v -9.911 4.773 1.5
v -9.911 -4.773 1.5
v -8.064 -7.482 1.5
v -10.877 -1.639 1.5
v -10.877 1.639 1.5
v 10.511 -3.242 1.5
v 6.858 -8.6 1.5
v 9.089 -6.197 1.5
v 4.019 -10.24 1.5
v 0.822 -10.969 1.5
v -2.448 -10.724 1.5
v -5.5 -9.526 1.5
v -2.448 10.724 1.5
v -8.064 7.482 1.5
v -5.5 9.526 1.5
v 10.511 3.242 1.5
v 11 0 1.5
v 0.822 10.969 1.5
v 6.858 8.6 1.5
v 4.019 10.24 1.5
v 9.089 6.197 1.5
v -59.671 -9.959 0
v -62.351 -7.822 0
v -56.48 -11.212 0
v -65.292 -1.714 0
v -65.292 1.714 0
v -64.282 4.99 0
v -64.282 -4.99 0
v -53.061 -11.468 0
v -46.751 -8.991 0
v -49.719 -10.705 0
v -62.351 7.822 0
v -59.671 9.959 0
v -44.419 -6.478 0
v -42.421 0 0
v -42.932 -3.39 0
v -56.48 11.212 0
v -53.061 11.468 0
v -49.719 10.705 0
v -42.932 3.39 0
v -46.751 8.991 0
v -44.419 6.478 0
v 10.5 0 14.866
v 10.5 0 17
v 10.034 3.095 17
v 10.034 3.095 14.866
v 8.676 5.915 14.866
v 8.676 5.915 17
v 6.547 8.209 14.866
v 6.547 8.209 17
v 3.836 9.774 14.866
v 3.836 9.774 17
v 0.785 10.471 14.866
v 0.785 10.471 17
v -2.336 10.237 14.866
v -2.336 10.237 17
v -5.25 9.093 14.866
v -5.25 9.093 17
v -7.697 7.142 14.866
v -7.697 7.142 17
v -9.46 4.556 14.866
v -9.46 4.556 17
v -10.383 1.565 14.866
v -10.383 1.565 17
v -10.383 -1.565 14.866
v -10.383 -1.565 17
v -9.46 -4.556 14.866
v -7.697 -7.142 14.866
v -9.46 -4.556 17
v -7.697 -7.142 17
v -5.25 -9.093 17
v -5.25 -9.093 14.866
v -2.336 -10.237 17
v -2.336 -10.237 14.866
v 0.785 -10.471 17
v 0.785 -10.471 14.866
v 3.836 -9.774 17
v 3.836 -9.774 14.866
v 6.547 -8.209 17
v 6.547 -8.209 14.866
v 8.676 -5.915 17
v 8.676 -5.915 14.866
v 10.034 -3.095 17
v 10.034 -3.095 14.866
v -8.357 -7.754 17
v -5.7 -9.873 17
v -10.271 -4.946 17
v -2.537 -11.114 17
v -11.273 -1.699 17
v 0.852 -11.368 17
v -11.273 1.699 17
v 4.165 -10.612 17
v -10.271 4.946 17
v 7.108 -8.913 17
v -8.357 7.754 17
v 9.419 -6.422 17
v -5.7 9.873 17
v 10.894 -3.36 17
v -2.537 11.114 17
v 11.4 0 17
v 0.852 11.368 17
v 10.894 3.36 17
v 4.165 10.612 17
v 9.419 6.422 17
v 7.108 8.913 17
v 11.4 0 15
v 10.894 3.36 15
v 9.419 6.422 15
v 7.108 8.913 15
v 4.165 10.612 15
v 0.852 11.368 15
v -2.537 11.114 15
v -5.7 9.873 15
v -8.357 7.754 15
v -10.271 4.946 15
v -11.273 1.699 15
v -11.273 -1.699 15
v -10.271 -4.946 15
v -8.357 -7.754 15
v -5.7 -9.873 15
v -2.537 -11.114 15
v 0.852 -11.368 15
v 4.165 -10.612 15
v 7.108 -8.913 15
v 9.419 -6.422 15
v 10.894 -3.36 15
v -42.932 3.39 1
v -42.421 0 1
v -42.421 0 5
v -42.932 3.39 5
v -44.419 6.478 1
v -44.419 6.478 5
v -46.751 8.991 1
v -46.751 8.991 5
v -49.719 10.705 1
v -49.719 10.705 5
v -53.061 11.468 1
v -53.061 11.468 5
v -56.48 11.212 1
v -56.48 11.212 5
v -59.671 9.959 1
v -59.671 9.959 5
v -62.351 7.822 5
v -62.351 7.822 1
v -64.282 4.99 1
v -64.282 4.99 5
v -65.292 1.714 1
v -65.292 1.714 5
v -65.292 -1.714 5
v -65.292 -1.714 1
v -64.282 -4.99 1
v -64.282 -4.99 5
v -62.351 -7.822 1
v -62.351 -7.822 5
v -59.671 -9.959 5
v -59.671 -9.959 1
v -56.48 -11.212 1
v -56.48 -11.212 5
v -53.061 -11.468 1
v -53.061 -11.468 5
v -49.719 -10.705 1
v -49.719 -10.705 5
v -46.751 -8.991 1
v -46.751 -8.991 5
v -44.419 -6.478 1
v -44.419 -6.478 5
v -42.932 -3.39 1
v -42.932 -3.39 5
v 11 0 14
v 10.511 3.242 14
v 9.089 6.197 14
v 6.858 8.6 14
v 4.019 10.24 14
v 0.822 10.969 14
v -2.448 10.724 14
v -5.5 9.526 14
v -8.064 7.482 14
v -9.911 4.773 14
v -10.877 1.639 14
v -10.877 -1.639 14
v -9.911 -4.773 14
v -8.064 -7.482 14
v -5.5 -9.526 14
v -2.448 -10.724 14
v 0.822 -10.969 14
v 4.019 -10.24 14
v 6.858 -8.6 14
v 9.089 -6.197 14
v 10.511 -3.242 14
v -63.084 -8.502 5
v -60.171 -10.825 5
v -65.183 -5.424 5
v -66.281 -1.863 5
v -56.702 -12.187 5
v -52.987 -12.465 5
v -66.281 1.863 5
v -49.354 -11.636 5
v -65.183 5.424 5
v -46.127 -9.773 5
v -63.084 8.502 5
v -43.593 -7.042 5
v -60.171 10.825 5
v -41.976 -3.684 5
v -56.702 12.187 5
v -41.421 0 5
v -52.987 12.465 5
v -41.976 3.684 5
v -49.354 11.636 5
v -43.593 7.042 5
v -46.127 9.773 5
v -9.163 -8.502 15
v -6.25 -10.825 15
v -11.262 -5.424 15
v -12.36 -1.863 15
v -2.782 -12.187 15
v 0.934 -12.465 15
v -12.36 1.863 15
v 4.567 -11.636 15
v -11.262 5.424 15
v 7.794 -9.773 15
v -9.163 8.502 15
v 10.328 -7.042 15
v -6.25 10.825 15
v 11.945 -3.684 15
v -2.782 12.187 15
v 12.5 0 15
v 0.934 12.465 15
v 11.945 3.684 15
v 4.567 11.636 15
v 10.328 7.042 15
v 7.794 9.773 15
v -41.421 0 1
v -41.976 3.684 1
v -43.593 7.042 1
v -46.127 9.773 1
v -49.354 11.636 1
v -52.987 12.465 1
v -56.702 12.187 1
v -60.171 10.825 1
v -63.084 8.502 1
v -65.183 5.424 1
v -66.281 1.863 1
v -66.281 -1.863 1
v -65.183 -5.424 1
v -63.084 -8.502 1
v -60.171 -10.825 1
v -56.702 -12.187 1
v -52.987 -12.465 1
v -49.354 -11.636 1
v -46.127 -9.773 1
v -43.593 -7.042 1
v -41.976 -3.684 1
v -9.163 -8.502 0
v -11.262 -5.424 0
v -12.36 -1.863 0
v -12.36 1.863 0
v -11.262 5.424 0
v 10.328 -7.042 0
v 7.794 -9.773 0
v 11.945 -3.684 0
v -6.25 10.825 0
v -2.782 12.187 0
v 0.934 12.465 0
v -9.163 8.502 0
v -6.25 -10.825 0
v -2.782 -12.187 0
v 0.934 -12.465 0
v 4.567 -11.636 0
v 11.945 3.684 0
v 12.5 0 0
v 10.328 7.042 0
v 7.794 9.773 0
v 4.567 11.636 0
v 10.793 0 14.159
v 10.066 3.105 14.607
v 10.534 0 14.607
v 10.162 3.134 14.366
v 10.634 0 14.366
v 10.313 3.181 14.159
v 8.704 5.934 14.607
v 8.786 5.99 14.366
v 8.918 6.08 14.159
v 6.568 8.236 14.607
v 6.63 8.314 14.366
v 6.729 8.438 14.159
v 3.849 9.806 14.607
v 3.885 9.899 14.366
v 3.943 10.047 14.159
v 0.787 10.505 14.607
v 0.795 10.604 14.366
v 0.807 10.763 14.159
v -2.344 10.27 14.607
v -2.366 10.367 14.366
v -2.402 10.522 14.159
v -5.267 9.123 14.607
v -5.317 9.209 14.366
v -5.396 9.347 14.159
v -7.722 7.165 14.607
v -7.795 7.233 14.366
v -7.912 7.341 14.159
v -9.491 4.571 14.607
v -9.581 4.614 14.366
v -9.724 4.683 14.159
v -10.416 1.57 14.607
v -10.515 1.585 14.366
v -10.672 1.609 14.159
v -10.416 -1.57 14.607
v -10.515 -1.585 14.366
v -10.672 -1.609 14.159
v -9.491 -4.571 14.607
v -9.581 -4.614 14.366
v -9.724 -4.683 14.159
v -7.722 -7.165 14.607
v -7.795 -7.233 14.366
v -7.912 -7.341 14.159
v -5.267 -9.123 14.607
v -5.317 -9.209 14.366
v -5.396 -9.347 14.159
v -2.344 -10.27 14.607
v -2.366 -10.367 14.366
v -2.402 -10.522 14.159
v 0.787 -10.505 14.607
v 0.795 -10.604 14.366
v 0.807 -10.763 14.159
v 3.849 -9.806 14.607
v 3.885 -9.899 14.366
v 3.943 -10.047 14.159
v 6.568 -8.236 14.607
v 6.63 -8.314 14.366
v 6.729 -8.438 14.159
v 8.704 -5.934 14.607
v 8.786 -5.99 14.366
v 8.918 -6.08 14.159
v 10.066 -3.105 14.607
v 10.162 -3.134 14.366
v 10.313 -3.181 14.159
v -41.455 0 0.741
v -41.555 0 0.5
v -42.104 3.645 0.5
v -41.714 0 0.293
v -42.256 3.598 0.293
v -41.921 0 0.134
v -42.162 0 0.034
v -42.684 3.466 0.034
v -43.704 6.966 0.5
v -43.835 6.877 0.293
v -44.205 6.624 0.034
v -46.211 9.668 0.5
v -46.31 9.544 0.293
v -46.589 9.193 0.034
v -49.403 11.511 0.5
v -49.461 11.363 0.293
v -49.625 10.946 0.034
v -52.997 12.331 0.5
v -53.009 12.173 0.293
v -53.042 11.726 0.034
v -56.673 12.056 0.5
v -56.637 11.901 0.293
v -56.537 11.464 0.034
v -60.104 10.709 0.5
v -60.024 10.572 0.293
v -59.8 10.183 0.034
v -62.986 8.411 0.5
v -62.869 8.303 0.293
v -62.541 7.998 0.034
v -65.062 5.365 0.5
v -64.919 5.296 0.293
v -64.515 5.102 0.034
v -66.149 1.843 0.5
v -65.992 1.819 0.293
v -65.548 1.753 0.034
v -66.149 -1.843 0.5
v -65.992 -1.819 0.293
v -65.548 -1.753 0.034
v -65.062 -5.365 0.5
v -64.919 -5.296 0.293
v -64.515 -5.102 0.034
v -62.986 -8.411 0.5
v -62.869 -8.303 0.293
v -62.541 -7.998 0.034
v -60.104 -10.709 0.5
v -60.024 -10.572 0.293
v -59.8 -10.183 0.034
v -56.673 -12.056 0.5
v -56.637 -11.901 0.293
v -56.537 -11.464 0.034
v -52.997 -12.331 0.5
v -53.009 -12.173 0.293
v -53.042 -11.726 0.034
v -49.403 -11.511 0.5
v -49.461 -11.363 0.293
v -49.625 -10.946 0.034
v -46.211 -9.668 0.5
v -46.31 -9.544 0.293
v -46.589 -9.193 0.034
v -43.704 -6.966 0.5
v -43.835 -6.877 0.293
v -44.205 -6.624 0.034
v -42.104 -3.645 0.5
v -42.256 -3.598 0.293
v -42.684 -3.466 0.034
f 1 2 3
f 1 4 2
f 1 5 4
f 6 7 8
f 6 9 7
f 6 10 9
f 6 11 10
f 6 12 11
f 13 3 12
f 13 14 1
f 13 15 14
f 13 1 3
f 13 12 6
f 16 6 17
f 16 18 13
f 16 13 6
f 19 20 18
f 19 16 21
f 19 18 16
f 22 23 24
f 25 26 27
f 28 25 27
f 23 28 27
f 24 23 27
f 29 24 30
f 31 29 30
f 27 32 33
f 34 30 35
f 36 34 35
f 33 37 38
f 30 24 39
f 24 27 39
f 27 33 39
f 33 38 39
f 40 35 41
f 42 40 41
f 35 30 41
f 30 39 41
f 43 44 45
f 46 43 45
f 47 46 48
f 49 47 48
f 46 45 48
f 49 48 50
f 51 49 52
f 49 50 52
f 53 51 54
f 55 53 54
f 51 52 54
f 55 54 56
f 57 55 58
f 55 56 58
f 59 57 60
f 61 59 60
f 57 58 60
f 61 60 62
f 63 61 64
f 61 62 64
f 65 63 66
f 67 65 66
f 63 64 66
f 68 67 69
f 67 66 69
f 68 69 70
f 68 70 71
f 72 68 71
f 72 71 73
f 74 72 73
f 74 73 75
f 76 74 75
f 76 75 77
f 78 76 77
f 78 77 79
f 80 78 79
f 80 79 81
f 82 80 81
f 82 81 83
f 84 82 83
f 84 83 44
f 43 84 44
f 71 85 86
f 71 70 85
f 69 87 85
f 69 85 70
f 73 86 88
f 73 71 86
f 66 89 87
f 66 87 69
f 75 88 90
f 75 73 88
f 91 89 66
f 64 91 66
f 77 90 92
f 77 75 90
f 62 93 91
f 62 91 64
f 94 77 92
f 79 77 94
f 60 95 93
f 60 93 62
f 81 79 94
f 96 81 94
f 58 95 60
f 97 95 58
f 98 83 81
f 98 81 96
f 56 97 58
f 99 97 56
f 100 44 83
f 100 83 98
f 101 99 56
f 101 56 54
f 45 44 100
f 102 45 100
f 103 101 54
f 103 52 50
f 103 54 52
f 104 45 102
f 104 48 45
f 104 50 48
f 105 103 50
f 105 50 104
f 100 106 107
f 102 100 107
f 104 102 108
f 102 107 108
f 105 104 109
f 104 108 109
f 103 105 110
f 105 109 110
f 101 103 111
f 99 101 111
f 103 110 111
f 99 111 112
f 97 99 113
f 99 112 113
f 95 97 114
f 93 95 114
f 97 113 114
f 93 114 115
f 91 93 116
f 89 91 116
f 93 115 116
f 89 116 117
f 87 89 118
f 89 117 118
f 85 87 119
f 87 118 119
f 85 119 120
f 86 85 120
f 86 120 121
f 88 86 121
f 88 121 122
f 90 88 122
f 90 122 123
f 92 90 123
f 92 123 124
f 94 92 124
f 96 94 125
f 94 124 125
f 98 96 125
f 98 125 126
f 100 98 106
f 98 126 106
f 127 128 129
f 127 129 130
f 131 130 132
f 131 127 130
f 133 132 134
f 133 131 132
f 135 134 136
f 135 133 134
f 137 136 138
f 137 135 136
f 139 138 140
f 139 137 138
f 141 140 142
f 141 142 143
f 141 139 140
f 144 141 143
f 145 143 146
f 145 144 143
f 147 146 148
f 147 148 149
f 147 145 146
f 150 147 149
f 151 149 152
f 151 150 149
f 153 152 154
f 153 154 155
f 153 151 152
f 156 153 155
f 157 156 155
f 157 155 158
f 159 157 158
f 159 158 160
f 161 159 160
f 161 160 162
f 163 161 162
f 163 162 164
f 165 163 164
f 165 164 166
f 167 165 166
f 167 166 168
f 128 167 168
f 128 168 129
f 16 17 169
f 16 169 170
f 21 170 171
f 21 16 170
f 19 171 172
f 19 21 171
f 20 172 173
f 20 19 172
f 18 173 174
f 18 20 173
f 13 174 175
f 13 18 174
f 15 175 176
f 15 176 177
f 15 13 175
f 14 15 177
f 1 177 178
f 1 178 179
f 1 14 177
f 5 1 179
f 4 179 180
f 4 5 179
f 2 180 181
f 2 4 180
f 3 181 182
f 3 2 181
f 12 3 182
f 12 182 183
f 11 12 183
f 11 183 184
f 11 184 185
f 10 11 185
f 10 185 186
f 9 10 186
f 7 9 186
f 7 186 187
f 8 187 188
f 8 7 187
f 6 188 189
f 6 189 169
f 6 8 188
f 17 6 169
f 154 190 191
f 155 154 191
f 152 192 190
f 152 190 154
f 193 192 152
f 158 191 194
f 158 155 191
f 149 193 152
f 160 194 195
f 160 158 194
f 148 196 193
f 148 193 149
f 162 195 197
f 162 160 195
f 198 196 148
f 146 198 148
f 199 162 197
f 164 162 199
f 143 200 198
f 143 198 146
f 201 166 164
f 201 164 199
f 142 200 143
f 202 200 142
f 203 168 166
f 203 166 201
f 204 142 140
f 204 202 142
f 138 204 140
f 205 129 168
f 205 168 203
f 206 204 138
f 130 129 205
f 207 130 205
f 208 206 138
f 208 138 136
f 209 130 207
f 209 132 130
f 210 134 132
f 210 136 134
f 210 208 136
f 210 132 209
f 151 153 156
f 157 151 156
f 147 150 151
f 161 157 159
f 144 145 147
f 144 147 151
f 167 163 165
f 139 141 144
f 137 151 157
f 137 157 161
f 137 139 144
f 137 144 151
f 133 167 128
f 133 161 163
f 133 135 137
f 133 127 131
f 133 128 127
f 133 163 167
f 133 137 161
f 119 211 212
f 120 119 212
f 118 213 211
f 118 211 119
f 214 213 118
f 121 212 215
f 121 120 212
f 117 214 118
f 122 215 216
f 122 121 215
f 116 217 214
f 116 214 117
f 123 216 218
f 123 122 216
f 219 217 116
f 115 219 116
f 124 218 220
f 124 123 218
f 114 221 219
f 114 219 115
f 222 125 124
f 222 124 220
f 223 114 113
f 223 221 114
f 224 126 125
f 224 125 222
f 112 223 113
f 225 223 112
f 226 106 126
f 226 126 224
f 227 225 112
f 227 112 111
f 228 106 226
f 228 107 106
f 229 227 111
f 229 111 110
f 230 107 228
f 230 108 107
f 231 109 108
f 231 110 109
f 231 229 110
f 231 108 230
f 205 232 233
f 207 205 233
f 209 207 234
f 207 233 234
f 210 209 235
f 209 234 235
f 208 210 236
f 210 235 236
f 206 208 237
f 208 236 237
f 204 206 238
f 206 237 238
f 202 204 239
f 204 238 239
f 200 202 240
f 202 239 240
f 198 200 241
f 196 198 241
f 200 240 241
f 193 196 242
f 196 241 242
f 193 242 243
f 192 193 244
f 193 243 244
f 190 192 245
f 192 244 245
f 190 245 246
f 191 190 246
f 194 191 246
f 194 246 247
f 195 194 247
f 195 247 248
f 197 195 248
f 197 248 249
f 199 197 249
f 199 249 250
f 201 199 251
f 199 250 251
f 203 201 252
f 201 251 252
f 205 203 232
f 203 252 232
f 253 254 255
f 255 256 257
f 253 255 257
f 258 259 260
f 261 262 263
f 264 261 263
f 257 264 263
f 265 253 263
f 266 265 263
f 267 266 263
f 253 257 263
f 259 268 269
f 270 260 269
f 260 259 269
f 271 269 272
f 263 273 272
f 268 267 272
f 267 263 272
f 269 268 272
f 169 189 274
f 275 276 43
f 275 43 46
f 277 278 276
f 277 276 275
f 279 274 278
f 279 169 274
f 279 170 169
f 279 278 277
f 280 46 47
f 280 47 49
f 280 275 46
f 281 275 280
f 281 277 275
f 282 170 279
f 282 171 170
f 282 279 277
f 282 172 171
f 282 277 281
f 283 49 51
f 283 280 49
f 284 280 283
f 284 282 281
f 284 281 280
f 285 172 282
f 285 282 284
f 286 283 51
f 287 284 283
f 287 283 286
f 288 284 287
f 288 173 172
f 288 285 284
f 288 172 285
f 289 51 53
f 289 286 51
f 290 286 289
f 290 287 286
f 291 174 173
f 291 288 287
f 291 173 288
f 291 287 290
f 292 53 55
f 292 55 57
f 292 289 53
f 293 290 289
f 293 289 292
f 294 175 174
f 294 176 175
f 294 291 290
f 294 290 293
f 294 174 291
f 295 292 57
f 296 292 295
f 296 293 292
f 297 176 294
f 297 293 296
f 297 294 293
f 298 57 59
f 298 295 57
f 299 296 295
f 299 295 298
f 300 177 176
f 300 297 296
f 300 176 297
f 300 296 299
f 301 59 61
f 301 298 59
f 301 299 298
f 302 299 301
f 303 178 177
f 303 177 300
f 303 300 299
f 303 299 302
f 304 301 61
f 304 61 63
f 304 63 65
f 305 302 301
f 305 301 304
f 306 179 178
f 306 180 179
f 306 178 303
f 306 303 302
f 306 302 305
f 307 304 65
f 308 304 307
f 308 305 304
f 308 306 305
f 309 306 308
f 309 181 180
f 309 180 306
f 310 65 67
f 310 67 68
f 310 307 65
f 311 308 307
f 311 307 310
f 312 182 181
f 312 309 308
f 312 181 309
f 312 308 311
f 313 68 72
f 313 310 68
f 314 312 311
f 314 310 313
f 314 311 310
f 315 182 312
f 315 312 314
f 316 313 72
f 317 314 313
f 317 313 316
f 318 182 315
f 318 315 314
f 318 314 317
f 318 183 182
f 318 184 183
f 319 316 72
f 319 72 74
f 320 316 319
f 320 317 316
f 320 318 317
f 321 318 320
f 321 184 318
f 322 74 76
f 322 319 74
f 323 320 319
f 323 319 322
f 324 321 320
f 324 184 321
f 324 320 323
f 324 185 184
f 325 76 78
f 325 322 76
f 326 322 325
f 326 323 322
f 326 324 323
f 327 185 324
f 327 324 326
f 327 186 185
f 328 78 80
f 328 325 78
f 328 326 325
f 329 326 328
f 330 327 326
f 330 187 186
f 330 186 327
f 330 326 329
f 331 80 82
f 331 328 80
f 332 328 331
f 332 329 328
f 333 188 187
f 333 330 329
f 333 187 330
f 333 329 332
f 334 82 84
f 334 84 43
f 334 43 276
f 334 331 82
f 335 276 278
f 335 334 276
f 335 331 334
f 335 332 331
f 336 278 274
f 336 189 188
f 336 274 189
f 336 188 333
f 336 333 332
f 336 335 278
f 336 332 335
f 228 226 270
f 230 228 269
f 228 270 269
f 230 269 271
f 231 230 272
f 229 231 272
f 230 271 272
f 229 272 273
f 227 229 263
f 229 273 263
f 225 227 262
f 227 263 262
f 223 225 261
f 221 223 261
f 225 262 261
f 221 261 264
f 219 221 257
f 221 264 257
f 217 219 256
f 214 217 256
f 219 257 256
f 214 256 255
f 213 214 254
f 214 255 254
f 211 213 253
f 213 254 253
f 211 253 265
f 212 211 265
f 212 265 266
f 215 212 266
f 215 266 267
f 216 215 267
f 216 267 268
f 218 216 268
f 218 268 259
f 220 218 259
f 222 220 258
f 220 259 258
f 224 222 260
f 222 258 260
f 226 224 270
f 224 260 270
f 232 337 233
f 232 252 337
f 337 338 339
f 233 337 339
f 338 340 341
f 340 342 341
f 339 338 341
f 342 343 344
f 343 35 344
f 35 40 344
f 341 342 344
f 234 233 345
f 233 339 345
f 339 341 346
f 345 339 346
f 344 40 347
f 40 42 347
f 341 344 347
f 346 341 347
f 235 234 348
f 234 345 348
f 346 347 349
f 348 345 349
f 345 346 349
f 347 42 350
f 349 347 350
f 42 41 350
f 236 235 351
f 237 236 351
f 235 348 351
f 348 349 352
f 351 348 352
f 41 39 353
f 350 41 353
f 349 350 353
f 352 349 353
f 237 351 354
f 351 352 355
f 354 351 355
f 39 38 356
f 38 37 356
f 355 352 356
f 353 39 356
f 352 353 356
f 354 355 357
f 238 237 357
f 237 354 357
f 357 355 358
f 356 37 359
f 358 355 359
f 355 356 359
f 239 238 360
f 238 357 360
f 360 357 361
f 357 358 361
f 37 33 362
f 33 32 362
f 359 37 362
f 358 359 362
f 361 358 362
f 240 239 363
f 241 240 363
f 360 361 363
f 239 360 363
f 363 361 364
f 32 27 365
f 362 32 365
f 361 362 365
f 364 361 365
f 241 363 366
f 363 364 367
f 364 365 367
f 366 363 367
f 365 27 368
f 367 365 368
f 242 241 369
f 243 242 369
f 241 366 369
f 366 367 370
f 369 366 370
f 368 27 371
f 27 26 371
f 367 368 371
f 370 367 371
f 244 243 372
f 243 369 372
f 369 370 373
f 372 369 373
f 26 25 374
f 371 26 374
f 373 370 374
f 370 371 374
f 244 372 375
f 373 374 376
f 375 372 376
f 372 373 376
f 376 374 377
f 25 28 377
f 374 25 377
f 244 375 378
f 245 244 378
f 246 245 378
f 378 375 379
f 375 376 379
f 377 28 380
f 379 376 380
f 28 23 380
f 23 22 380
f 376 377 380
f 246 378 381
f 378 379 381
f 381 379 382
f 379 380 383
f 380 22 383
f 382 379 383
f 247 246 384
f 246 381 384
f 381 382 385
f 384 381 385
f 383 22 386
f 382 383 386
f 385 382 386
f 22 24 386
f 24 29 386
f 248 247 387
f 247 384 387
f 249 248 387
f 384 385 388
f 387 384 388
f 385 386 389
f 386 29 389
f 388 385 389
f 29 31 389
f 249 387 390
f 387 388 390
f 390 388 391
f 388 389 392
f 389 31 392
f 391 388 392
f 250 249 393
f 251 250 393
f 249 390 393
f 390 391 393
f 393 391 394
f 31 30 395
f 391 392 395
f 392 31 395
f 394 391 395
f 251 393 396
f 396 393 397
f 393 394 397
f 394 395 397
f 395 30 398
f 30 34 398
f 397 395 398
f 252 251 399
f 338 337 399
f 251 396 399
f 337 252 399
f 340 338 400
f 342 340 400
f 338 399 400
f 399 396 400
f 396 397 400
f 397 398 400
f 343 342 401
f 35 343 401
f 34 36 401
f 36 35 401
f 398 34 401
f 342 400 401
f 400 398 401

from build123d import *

# Parameters (mm, degrees)
F0_R      = 12.5
F1_DEPTH  = 15
F2_T      = -1.5
F3_R      = 11.4
F3_R_2    = 11
F4_DEPTH  = 2
F5_R      = 12.5
F6_DEPTH  = 5
F7_T      = -1
F8_R      = 1
F10_R     = 11
F10_R_2   = 10.5
F11_DEPTH = 3


# Not quite as in the source:
# - a fillet or chamfer that OpenCascade refuses, or shapes differently, is made with other operations: its cross-section is extruded or revolved along the edge and cut away or added


with BuildPart() as f1:
    # F0 (on Top) → F1 (new body)
    with BuildSketch(Plane.XY):
        Circle(F0_R)
    extrude(amount=F1_DEPTH)

    # F2
    f2_openings = [f1.faces().sort_by_distance(p)[0] for p in [
        (0, 0, 15),
    ]]
    offset(amount=F2_T, openings=f2_openings)

    # F3 (on face) → F4 (join)
    with BuildSketch(Plane.XY.offset(15)):
        Circle(F3_R)
        Circle(F3_R_2, mode=Mode.SUBTRACT)
    extrude(amount=F4_DEPTH)

    # F10 (on face) → F11 (join)
    with BuildSketch(Plane.XY.offset(17)):
        Circle(F10_R)
        Circle(F10_R_2, mode=Mode.SUBTRACT)
    extrude(amount=-F11_DEPTH)

    # F12: fillet of radius 1 on 1 edges, made by hand

    # F12_s1 → F12_t2 (revolve, cut)
    with BuildSketch(Plane.XZ):
        with BuildLine():
            ThreePointArc((10.5, 14.8660254038), (10.6339745962, 14.3660254038), (11, 14))
            Line((11, 14), (10.5, 14))
            Line((10.5, 14), (10.5, 14.8660254038))
        make_face()
    revolve(axis=Axis((0, 0, 14), (0, 0, 1)), mode=Mode.SUBTRACT)


with BuildPart() as f6:
    # F5 (on Top) → F6 (new body)
    with BuildSketch(Plane.XY):
        with Locations((-53.9208427072, 0)):
            Circle(F5_R)
    extrude(amount=F6_DEPTH)

    # F7
    f7_openings = [f6.faces().sort_by_distance(p)[0] for p in [
        (-53.920843, 0, 5),
    ]]
    offset(amount=F7_T, openings=f7_openings)

    # F8
    f8_edges = [f6.edges().sort_by_distance(p)[0] for p in [
        (-66.420843, 0, 0),
    ]]
    fillet(f8_edges, radius=F8_R)


solid = Compound([f1.part, f6.part])
